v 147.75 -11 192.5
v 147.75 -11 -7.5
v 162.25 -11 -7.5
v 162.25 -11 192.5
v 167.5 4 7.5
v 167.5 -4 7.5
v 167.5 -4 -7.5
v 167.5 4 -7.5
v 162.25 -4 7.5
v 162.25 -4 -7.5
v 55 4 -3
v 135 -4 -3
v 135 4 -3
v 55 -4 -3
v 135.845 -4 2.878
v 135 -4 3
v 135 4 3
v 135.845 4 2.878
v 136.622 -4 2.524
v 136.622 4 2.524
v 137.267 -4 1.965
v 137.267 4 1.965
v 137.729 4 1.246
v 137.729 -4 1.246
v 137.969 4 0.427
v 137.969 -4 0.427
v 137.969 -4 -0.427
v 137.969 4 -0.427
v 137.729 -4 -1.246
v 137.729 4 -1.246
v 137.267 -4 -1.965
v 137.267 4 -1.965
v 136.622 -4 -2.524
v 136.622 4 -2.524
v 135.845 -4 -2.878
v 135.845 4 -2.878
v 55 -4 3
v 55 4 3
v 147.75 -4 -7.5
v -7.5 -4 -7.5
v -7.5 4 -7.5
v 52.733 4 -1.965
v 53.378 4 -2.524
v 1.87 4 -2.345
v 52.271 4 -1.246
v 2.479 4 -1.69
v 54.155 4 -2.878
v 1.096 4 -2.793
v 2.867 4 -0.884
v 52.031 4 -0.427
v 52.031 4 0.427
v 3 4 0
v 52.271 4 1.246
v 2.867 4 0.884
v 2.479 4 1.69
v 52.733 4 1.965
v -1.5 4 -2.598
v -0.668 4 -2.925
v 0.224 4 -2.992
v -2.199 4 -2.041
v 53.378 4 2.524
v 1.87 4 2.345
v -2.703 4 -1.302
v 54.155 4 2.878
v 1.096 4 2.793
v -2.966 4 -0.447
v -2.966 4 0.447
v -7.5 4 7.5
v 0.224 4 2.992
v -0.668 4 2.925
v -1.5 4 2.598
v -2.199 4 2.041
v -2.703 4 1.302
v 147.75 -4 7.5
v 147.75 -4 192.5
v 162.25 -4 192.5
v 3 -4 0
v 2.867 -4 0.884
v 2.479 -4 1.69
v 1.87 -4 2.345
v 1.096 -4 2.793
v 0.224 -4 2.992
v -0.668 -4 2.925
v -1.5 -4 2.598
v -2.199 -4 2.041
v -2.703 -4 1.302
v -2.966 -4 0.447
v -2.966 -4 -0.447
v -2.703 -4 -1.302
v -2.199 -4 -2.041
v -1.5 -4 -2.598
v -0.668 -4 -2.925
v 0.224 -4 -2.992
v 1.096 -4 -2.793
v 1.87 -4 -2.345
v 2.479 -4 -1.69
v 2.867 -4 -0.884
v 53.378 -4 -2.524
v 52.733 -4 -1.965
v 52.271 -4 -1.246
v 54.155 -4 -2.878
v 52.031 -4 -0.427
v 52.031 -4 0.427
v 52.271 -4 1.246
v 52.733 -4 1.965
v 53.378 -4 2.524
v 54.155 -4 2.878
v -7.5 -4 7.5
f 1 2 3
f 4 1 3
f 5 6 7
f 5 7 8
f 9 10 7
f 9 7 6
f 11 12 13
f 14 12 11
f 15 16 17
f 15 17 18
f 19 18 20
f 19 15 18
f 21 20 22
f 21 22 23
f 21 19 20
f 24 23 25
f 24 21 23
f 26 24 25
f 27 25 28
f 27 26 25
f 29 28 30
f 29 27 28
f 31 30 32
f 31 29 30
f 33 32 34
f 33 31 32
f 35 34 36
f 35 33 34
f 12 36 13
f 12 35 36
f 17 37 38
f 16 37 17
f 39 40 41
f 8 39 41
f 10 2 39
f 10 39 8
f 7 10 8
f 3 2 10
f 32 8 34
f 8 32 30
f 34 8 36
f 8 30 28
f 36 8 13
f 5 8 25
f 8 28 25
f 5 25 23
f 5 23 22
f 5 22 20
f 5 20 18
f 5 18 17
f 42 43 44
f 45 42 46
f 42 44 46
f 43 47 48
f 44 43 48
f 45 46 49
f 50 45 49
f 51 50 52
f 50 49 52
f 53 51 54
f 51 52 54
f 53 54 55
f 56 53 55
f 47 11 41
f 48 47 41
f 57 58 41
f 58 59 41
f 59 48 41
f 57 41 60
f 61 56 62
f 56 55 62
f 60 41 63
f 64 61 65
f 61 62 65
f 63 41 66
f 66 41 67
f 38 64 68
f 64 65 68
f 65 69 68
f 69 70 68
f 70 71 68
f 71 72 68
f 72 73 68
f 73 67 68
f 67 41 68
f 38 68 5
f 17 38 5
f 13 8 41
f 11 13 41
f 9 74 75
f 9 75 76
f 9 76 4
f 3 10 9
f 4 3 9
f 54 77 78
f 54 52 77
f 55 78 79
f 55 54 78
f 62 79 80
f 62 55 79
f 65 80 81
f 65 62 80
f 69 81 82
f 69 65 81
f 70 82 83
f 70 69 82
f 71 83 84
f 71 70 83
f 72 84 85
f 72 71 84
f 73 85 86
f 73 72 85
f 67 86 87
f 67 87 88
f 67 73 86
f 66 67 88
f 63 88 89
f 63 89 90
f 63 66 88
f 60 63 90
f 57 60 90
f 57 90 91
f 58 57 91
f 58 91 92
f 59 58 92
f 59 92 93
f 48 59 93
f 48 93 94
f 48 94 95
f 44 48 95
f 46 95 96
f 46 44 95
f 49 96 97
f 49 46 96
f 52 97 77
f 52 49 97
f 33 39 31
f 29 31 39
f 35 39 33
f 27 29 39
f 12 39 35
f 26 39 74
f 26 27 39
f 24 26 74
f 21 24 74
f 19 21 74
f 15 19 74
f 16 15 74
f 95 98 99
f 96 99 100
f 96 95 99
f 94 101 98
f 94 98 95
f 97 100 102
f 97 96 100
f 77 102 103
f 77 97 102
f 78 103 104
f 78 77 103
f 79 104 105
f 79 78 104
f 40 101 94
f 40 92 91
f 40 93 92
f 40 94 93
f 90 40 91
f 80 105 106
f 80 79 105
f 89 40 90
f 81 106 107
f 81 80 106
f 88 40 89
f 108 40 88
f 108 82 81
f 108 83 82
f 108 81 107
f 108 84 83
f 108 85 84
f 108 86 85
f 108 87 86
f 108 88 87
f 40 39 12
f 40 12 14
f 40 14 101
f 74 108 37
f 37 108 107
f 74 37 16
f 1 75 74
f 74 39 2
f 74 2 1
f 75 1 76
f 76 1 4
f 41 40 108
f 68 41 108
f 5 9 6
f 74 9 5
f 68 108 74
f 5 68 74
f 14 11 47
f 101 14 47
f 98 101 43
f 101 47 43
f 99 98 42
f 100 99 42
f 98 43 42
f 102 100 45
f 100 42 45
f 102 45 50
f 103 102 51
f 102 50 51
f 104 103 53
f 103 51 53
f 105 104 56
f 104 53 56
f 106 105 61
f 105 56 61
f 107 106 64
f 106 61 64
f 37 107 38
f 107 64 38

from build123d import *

# Parameters (mm, degrees)
F0_W     = 150
F0_H     = 15
F0_R     = 3
F1_DEPTH = 4
F2_W     = 8
F2_H     = 15
F3_DEPTH = 25
F4_W     = 14.5
F4_H     = 7
F5_DEPTH = 200


with BuildPart() as f1:
    # F0 (on Front) → F1 (new body, symmetric)
    with BuildSketch(Plane.XZ):
        with Locations((67.5, 0)):
            Rectangle(F0_W, F0_H)
        Circle(F0_R, mode=Mode.SUBTRACT)
        with BuildLine():
            ThreePointArc((55, -3), (52, 0), (55, 3))
            Line((55, 3), (135, 3))
            ThreePointArc((135, 3), (138, 0), (135, -3))
            Line((135, -3), (55, -3))
        make_face(mode=Mode.SUBTRACT)
    extrude(amount=F1_DEPTH, both=True)

    # F2 (on face) → F3 (join)
    with BuildSketch(Plane.YZ.offset(142.5)):
        Rectangle(F2_W, F2_H)
    extrude(amount=F3_DEPTH)

    # F4 (on face) → F5 (join)
    with BuildSketch(Plane(origin=(0, 0, -7.5), x_dir=(1, 0, 0), z_dir=(0, 0, -1))):
        with Locations((155, 7.5)):
            Rectangle(F4_W, F4_H)
    extrude(amount=-F5_DEPTH)


solid = f1.part
